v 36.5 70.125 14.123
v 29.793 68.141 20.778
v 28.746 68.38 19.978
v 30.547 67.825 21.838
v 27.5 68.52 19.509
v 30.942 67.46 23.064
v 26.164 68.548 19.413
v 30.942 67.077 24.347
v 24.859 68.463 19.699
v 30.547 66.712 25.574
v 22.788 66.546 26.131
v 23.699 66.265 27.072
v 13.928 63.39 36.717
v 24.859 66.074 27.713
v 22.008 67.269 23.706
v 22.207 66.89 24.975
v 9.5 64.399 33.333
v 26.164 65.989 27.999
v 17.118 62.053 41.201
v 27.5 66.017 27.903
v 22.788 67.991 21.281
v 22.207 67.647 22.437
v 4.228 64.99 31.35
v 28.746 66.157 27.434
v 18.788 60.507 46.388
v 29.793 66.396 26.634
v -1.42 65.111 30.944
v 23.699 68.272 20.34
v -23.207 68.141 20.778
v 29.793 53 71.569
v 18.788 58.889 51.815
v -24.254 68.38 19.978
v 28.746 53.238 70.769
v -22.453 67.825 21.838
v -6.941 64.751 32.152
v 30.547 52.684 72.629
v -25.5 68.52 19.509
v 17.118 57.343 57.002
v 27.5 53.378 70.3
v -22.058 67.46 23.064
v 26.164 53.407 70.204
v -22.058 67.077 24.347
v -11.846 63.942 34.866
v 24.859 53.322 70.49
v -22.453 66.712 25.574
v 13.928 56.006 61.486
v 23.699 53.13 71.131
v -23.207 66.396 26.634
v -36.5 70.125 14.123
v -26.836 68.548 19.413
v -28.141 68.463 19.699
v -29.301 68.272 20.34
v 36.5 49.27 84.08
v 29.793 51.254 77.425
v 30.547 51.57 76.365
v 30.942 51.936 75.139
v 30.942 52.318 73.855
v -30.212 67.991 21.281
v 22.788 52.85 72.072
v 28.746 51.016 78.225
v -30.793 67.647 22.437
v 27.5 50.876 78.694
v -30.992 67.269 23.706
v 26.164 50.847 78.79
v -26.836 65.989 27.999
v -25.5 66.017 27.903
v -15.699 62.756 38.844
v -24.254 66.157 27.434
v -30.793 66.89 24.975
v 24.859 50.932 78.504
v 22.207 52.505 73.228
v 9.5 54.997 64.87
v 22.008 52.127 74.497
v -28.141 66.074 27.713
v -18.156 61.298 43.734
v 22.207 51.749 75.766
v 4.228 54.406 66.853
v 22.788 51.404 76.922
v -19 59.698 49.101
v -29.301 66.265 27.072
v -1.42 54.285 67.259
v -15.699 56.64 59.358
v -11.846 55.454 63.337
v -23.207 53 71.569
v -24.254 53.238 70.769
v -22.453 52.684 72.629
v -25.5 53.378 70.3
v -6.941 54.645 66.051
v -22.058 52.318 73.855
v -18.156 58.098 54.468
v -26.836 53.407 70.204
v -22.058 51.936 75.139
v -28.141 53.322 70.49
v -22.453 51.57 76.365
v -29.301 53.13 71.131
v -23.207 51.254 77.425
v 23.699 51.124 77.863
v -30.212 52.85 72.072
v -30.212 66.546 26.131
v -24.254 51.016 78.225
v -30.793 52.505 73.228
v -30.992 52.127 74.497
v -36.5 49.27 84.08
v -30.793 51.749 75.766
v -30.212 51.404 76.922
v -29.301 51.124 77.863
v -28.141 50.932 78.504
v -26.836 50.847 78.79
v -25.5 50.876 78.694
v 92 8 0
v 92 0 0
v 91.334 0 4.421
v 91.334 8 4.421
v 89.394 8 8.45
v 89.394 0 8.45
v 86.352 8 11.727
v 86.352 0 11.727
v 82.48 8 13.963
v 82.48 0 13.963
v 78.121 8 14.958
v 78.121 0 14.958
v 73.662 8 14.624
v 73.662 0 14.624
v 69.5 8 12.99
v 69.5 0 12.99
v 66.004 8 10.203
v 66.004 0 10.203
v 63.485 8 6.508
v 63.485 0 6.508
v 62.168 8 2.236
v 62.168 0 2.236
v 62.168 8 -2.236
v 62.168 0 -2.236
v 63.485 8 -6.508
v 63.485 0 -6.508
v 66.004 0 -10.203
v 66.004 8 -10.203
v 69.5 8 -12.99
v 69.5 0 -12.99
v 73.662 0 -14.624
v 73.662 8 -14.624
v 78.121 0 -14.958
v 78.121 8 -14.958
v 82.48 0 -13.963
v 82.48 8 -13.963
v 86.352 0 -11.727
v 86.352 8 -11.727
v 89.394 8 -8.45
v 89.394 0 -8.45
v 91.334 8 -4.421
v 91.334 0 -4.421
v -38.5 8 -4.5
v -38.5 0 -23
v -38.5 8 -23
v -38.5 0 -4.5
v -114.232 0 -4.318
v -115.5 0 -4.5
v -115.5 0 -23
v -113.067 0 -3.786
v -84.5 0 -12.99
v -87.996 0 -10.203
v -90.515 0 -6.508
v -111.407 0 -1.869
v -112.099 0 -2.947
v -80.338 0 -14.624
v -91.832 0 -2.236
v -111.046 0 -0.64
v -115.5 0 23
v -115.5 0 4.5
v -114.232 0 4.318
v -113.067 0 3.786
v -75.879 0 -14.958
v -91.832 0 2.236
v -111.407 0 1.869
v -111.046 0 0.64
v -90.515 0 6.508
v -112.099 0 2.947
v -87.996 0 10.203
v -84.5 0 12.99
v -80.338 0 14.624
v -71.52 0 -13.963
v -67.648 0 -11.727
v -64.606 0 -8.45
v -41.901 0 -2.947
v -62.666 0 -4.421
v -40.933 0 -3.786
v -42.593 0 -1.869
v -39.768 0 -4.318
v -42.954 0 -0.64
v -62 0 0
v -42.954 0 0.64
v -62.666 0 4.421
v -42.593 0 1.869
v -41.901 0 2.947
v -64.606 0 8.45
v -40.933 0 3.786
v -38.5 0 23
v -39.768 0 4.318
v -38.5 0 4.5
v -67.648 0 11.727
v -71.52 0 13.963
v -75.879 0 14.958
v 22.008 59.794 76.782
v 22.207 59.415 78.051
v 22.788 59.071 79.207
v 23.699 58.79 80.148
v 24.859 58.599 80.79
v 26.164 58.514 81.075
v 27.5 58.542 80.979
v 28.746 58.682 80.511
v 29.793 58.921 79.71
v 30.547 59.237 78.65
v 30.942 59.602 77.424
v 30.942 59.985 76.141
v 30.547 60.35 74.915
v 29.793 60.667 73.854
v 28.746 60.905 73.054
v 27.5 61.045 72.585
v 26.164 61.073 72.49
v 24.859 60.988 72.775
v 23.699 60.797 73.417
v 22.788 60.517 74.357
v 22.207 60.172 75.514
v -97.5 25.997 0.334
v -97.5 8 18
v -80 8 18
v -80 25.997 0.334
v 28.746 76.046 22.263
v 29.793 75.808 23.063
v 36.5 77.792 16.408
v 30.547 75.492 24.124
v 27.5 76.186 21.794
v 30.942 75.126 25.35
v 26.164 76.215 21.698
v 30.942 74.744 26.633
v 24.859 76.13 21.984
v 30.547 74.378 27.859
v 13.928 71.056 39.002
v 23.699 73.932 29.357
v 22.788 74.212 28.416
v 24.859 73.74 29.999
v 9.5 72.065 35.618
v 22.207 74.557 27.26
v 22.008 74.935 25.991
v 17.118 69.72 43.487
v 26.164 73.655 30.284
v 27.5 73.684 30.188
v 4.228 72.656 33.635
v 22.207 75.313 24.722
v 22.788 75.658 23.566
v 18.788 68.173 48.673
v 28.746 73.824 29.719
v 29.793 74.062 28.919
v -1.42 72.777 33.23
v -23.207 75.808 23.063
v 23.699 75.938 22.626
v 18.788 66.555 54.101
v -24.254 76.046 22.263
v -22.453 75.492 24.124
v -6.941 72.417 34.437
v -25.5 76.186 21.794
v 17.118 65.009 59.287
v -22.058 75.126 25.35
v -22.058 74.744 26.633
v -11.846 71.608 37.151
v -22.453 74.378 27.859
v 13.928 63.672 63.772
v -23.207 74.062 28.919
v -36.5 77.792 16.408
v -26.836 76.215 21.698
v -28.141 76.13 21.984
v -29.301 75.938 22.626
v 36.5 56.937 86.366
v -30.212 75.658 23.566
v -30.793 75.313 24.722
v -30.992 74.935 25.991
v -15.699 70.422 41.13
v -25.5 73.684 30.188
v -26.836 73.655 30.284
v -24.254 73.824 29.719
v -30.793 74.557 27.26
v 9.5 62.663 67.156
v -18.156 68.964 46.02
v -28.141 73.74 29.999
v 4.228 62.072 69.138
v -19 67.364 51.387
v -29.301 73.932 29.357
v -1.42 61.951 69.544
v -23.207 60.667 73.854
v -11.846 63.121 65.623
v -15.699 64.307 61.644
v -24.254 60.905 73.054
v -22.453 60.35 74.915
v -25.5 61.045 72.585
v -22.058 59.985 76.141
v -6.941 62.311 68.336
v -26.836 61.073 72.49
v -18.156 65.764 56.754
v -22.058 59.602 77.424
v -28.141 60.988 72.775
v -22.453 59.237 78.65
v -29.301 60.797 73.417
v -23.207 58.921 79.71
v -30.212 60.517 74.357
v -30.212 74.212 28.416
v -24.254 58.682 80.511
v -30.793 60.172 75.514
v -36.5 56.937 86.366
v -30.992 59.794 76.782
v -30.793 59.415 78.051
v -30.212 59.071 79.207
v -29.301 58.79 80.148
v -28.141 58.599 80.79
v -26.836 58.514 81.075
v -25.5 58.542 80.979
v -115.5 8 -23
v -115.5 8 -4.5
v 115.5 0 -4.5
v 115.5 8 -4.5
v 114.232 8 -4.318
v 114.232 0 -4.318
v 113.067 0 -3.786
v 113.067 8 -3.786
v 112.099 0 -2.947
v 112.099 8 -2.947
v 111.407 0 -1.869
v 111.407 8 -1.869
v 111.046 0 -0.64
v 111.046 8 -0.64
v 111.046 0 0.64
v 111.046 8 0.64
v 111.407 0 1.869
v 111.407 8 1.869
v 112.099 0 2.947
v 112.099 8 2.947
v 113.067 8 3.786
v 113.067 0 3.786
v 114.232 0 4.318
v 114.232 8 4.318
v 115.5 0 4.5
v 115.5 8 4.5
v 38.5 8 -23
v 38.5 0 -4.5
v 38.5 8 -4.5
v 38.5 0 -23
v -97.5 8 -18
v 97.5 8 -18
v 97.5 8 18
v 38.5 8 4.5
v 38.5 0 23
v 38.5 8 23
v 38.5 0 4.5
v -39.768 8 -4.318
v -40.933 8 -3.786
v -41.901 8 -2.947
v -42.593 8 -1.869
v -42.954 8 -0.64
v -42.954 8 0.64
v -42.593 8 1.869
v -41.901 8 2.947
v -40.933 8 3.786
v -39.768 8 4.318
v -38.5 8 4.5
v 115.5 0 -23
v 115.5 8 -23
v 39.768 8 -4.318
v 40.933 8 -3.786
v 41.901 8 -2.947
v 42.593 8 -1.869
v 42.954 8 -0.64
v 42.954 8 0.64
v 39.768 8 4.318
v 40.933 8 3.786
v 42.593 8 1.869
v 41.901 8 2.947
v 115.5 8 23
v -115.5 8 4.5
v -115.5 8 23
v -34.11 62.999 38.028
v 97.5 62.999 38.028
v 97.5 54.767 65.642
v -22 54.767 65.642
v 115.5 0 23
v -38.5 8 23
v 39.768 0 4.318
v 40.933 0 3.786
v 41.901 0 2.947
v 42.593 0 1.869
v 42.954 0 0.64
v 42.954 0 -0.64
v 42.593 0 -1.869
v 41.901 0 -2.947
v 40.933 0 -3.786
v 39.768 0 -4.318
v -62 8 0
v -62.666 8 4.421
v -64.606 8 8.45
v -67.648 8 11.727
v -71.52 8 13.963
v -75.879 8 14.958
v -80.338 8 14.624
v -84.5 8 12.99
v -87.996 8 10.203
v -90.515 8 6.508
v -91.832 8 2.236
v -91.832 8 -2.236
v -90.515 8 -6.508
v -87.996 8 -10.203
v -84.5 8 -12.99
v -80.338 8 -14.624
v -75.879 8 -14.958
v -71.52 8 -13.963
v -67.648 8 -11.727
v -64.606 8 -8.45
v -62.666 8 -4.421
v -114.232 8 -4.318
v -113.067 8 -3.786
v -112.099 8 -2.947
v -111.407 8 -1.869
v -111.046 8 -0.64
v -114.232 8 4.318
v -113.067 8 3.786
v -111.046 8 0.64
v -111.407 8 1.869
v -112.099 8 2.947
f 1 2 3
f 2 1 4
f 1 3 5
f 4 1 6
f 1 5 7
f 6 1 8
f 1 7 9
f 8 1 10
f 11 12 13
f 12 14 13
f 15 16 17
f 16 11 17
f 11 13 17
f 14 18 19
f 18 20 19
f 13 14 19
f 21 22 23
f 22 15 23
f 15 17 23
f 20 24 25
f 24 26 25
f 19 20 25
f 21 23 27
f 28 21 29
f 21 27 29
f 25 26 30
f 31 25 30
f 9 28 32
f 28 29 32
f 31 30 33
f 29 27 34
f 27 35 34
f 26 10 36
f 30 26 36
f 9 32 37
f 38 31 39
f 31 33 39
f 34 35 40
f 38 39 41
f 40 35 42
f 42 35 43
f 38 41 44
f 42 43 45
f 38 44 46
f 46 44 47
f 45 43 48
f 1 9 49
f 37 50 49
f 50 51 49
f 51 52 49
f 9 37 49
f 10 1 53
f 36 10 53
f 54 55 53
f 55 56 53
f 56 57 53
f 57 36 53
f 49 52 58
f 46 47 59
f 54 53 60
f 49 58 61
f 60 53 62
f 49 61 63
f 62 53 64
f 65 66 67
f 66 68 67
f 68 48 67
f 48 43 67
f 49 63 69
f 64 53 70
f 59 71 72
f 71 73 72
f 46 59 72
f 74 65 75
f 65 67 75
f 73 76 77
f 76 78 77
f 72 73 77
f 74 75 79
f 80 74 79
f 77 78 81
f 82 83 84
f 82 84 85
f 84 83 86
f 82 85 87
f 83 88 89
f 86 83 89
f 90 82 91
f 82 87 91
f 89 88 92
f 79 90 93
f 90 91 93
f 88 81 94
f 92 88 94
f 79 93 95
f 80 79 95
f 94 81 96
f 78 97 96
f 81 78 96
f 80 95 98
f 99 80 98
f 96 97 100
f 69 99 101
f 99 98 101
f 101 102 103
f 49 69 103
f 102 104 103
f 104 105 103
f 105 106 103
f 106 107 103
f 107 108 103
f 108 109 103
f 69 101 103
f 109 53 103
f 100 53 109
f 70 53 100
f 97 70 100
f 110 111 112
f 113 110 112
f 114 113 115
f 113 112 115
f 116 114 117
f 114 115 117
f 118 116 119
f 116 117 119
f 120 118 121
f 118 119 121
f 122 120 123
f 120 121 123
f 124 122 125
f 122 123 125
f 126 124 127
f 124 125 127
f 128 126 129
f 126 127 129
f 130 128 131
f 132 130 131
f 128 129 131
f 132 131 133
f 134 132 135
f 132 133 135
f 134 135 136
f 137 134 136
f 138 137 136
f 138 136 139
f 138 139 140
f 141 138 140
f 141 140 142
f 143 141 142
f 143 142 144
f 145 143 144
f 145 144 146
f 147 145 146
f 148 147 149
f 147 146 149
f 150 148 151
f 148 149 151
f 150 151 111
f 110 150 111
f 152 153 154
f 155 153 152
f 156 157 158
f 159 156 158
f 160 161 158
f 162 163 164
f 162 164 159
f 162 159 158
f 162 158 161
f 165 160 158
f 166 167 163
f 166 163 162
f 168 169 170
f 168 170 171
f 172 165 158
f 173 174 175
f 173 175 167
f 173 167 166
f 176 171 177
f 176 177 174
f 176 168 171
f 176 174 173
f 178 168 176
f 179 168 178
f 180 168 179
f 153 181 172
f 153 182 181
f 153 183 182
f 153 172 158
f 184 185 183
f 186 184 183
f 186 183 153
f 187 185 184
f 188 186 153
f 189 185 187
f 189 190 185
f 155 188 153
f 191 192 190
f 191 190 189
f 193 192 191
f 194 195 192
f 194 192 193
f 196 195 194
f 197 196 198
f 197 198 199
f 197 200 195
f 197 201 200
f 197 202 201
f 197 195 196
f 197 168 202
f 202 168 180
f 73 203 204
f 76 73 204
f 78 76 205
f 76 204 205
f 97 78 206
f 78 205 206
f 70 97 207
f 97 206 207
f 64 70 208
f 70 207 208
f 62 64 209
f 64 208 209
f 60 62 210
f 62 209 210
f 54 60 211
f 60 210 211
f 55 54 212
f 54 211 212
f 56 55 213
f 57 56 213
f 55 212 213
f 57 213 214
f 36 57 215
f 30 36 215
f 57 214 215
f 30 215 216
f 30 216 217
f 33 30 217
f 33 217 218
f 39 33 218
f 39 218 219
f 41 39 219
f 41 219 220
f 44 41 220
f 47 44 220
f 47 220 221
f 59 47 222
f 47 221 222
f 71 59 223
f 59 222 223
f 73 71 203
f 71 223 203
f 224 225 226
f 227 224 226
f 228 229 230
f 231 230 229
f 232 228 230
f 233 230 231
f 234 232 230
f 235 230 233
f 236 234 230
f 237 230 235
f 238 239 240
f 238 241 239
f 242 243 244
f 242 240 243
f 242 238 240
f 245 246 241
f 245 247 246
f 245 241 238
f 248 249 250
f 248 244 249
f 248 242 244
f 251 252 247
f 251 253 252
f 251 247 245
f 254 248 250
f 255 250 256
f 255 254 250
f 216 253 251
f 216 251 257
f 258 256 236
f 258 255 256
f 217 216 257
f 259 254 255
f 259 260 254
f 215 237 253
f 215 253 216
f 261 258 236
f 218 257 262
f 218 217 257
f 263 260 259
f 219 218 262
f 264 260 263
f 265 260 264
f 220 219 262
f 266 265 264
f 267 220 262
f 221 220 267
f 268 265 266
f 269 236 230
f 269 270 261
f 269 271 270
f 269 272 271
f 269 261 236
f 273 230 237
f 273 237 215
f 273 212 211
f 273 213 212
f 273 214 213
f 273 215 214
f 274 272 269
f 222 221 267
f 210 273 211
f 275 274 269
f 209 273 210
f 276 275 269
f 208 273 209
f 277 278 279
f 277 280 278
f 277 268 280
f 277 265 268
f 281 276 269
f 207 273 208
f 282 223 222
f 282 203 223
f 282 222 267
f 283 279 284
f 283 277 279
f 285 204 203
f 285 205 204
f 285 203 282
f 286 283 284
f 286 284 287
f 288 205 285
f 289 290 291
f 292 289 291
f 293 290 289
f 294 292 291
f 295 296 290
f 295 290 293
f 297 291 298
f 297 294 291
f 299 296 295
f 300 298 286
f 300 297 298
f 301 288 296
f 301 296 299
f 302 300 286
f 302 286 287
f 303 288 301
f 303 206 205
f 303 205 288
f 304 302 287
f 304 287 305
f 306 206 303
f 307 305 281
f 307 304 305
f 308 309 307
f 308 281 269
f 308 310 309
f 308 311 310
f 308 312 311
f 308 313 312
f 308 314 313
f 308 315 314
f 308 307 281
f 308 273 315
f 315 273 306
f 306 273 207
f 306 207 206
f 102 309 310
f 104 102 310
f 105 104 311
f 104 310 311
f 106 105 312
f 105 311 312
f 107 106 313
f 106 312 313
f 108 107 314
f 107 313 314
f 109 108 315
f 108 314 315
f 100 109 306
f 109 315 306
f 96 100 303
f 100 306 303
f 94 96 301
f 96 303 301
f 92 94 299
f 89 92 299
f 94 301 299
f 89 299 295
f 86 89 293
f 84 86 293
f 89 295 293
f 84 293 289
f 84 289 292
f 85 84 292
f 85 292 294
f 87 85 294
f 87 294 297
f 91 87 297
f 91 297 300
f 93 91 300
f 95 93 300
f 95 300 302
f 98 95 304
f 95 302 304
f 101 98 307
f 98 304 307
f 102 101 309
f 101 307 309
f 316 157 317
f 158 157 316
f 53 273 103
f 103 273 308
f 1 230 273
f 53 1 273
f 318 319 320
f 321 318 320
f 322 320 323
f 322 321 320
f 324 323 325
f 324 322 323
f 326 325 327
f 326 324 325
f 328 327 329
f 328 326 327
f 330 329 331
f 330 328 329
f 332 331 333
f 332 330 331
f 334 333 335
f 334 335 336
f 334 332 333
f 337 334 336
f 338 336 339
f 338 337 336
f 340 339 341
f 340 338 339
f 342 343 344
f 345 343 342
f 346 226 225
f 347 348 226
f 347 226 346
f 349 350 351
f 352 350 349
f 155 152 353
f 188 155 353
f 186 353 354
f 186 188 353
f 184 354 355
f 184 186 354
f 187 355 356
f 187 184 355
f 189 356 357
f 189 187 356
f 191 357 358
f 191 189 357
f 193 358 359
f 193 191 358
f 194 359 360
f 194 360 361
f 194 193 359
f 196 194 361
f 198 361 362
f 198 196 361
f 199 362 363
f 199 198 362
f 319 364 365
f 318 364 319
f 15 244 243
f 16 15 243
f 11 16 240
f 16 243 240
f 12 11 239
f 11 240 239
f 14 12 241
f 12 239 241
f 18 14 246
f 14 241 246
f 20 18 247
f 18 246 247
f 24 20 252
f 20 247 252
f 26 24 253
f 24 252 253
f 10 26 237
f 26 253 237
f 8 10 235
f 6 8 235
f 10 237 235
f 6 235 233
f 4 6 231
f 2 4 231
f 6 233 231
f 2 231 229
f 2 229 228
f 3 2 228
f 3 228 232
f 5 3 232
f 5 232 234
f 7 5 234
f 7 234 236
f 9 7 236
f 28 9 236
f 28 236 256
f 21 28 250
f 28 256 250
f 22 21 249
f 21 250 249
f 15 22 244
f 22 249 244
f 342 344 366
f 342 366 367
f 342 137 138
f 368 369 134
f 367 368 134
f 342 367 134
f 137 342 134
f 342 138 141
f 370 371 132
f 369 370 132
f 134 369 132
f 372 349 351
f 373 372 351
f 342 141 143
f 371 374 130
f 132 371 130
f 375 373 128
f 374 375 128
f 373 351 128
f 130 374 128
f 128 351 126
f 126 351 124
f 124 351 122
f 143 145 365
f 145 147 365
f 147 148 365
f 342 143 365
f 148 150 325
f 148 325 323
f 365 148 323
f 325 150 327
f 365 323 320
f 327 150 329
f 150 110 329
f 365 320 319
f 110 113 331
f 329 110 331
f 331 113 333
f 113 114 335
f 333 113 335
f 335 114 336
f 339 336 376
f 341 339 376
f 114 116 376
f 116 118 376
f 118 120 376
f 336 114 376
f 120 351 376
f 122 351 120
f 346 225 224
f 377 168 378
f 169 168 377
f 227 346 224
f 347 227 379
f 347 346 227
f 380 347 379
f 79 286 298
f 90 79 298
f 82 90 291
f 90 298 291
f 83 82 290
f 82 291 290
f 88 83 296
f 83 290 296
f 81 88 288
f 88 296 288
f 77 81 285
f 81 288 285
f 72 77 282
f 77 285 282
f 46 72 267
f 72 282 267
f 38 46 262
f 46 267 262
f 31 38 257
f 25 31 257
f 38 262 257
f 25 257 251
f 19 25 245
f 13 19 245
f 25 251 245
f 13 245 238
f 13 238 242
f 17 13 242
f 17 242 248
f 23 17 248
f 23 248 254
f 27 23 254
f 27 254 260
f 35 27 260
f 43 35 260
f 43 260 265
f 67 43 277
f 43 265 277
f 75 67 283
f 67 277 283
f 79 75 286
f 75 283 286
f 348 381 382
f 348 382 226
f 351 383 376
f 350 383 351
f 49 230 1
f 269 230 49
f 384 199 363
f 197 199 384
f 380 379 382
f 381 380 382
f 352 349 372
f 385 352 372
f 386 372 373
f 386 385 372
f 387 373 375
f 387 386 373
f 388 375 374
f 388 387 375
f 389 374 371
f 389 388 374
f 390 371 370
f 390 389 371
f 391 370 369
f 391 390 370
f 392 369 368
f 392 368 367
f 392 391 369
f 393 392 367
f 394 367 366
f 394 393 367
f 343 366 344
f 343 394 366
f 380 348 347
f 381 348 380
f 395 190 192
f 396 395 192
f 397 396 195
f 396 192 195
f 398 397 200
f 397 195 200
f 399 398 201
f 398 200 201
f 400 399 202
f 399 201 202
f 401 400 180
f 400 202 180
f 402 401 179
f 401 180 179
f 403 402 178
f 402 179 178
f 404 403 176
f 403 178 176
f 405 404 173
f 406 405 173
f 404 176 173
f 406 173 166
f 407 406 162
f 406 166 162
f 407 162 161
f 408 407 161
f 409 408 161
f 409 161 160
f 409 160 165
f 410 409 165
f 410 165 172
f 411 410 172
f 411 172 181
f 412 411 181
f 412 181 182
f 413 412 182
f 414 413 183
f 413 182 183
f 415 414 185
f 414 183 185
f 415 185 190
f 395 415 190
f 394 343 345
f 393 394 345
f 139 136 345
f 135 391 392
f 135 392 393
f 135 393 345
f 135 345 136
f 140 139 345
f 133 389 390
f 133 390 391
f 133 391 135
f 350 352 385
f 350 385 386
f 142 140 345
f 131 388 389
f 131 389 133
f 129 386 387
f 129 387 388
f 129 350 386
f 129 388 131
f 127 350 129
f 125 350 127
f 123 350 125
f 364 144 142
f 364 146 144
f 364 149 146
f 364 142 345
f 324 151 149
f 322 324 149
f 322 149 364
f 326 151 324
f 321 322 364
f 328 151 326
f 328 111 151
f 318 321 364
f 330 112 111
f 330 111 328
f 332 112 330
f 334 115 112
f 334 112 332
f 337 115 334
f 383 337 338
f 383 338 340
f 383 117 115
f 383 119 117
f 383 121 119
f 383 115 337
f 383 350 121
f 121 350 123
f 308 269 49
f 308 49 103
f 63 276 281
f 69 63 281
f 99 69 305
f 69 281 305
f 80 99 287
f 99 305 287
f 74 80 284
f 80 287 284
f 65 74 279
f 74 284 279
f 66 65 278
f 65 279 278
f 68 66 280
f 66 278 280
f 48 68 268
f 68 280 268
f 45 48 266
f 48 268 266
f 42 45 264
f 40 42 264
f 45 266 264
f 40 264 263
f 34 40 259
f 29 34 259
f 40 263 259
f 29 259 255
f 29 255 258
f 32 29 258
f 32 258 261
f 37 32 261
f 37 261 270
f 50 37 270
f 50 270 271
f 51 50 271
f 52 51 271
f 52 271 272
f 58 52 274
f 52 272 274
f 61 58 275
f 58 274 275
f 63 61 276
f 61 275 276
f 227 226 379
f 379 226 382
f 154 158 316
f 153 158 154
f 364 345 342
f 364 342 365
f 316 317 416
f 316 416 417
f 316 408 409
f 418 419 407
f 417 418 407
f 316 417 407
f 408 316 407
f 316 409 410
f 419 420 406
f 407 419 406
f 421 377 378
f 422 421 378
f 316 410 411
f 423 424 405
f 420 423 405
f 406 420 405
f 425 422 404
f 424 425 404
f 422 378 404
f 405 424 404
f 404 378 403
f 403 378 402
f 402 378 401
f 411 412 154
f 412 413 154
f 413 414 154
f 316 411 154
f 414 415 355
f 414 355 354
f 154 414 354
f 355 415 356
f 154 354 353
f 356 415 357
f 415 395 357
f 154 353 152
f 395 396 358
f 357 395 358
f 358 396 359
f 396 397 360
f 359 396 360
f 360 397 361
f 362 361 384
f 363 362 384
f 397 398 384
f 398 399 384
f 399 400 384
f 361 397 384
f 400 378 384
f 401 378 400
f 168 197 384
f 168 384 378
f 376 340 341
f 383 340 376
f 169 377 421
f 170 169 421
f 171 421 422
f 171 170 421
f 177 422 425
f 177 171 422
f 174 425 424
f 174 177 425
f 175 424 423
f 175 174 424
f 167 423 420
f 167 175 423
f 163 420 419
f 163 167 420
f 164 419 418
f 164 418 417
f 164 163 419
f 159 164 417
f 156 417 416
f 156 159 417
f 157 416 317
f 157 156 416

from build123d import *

# Parameters (mm, degrees)
F0_R     = 15
F1_DEPTH = 8
F4_W     = 73
F4_H     = 73
F4_R     = 4.4920969668
F4_R_2   = 19
F5_DEPTH = 8
F7_DEPTH = 97.5
F9_DEPTH = 78.5281878747


with BuildPart() as f1:
    # F0 (on Front) → F1 (new body)
    with BuildSketch(Plane.XZ):
        with BuildLine():
            Line((-38.5, 23), (-115.5, 23))
            Line((-115.5, 23), (-115.5, 4.5))
            ThreePointArc((-115.5, 4.5), (-111, 0), (-115.5, -4.5))
            Line((-115.5, -4.5), (-115.5, -23))
            Line((-115.5, -23), (-38.5, -23))
            Line((-38.5, -23), (-38.5, -4.5))
            ThreePointArc((-38.5, -4.5), (-43, 0), (-38.5, 4.5))
            Line((-38.5, 4.5), (-38.5, 23))
        make_face()
        with Locations((-77, 0)):
            Circle(F0_R, mode=Mode.SUBTRACT)
    extrude(amount=-F1_DEPTH)


with BuildPart() as f1b:
    # F0 (on Front) → F1, piece 2 (new body)
    with BuildSketch(Plane.XZ):
        with BuildLine():
            Line((115.5, 23), (38.5, 23))
            Line((38.5, 23), (38.5, 4.5))
            ThreePointArc((38.5, 4.5), (43, 0), (38.5, -4.5))
            Line((38.5, -4.5), (38.5, -23))
            Line((38.5, -23), (115.5, -23))
            Line((115.5, -23), (115.5, -4.5))
            ThreePointArc((115.5, -4.5), (111, 0), (115.5, 4.5))
            Line((115.5, 4.5), (115.5, 23))
        make_face()
        with Locations((77, 0)):
            Circle(F0_R, mode=Mode.SUBTRACT)
    extrude(amount=-F1_DEPTH)


with BuildPart() as f5:
    # F4 (on face) → F5 (new body)
    with BuildSketch(Plane(origin=(0, 75.9350016642, 22.6372071705), x_dir=(-1, 0, 0), z_dir=(0, 0.9583225745, 0.2856883674))):
        with Locations((0, 30)):
            Rectangle(F4_W, F4_H)
        with Locations((-26.5, 3.5)):
            Circle(F4_R, mode=Mode.SUBTRACT)
        with Locations((26.5, 3.5)):
            Circle(F4_R, mode=Mode.SUBTRACT)
        with Locations((-26.5, 56.5)):
            Circle(F4_R, mode=Mode.SUBTRACT)
        with Locations((0, 30)):
            Circle(F4_R_2, mode=Mode.SUBTRACT)
        with Locations((26.5, 56.5)):
            Circle(F4_R, mode=Mode.SUBTRACT)
    extrude(amount=-F5_DEPTH)


with BuildPart() as f7:
    # F6 (on Right) → F7 (new body, symmetric)
    with BuildSketch(Plane.YZ):
        Polygon((62.9987630306, 38.0284166596), (54.7667194692, 65.6422577498), (8, 18), (8, -18), align=None)
    extrude(amount=F7_DEPTH, both=True)

    # F8 (on face) → F9 (cut, through all)
    with BuildSketch(Plane(origin=(0, -4.9242673194, 4.8337723525), x_dir=(1, 0, 0), z_dir=(0, -0.7136337229, 0.7005190287))):
        Polygon((-80, 18.4495592417), (-22, 85.209657904), (-97.5, 85.209657904), (-97.5, 18.4495592417), align=None)
    extrude(amount=-F9_DEPTH, mode=Mode.SUBTRACT)


solid = Compound([f1.part, f1b.part, f5.part, f7.part])
